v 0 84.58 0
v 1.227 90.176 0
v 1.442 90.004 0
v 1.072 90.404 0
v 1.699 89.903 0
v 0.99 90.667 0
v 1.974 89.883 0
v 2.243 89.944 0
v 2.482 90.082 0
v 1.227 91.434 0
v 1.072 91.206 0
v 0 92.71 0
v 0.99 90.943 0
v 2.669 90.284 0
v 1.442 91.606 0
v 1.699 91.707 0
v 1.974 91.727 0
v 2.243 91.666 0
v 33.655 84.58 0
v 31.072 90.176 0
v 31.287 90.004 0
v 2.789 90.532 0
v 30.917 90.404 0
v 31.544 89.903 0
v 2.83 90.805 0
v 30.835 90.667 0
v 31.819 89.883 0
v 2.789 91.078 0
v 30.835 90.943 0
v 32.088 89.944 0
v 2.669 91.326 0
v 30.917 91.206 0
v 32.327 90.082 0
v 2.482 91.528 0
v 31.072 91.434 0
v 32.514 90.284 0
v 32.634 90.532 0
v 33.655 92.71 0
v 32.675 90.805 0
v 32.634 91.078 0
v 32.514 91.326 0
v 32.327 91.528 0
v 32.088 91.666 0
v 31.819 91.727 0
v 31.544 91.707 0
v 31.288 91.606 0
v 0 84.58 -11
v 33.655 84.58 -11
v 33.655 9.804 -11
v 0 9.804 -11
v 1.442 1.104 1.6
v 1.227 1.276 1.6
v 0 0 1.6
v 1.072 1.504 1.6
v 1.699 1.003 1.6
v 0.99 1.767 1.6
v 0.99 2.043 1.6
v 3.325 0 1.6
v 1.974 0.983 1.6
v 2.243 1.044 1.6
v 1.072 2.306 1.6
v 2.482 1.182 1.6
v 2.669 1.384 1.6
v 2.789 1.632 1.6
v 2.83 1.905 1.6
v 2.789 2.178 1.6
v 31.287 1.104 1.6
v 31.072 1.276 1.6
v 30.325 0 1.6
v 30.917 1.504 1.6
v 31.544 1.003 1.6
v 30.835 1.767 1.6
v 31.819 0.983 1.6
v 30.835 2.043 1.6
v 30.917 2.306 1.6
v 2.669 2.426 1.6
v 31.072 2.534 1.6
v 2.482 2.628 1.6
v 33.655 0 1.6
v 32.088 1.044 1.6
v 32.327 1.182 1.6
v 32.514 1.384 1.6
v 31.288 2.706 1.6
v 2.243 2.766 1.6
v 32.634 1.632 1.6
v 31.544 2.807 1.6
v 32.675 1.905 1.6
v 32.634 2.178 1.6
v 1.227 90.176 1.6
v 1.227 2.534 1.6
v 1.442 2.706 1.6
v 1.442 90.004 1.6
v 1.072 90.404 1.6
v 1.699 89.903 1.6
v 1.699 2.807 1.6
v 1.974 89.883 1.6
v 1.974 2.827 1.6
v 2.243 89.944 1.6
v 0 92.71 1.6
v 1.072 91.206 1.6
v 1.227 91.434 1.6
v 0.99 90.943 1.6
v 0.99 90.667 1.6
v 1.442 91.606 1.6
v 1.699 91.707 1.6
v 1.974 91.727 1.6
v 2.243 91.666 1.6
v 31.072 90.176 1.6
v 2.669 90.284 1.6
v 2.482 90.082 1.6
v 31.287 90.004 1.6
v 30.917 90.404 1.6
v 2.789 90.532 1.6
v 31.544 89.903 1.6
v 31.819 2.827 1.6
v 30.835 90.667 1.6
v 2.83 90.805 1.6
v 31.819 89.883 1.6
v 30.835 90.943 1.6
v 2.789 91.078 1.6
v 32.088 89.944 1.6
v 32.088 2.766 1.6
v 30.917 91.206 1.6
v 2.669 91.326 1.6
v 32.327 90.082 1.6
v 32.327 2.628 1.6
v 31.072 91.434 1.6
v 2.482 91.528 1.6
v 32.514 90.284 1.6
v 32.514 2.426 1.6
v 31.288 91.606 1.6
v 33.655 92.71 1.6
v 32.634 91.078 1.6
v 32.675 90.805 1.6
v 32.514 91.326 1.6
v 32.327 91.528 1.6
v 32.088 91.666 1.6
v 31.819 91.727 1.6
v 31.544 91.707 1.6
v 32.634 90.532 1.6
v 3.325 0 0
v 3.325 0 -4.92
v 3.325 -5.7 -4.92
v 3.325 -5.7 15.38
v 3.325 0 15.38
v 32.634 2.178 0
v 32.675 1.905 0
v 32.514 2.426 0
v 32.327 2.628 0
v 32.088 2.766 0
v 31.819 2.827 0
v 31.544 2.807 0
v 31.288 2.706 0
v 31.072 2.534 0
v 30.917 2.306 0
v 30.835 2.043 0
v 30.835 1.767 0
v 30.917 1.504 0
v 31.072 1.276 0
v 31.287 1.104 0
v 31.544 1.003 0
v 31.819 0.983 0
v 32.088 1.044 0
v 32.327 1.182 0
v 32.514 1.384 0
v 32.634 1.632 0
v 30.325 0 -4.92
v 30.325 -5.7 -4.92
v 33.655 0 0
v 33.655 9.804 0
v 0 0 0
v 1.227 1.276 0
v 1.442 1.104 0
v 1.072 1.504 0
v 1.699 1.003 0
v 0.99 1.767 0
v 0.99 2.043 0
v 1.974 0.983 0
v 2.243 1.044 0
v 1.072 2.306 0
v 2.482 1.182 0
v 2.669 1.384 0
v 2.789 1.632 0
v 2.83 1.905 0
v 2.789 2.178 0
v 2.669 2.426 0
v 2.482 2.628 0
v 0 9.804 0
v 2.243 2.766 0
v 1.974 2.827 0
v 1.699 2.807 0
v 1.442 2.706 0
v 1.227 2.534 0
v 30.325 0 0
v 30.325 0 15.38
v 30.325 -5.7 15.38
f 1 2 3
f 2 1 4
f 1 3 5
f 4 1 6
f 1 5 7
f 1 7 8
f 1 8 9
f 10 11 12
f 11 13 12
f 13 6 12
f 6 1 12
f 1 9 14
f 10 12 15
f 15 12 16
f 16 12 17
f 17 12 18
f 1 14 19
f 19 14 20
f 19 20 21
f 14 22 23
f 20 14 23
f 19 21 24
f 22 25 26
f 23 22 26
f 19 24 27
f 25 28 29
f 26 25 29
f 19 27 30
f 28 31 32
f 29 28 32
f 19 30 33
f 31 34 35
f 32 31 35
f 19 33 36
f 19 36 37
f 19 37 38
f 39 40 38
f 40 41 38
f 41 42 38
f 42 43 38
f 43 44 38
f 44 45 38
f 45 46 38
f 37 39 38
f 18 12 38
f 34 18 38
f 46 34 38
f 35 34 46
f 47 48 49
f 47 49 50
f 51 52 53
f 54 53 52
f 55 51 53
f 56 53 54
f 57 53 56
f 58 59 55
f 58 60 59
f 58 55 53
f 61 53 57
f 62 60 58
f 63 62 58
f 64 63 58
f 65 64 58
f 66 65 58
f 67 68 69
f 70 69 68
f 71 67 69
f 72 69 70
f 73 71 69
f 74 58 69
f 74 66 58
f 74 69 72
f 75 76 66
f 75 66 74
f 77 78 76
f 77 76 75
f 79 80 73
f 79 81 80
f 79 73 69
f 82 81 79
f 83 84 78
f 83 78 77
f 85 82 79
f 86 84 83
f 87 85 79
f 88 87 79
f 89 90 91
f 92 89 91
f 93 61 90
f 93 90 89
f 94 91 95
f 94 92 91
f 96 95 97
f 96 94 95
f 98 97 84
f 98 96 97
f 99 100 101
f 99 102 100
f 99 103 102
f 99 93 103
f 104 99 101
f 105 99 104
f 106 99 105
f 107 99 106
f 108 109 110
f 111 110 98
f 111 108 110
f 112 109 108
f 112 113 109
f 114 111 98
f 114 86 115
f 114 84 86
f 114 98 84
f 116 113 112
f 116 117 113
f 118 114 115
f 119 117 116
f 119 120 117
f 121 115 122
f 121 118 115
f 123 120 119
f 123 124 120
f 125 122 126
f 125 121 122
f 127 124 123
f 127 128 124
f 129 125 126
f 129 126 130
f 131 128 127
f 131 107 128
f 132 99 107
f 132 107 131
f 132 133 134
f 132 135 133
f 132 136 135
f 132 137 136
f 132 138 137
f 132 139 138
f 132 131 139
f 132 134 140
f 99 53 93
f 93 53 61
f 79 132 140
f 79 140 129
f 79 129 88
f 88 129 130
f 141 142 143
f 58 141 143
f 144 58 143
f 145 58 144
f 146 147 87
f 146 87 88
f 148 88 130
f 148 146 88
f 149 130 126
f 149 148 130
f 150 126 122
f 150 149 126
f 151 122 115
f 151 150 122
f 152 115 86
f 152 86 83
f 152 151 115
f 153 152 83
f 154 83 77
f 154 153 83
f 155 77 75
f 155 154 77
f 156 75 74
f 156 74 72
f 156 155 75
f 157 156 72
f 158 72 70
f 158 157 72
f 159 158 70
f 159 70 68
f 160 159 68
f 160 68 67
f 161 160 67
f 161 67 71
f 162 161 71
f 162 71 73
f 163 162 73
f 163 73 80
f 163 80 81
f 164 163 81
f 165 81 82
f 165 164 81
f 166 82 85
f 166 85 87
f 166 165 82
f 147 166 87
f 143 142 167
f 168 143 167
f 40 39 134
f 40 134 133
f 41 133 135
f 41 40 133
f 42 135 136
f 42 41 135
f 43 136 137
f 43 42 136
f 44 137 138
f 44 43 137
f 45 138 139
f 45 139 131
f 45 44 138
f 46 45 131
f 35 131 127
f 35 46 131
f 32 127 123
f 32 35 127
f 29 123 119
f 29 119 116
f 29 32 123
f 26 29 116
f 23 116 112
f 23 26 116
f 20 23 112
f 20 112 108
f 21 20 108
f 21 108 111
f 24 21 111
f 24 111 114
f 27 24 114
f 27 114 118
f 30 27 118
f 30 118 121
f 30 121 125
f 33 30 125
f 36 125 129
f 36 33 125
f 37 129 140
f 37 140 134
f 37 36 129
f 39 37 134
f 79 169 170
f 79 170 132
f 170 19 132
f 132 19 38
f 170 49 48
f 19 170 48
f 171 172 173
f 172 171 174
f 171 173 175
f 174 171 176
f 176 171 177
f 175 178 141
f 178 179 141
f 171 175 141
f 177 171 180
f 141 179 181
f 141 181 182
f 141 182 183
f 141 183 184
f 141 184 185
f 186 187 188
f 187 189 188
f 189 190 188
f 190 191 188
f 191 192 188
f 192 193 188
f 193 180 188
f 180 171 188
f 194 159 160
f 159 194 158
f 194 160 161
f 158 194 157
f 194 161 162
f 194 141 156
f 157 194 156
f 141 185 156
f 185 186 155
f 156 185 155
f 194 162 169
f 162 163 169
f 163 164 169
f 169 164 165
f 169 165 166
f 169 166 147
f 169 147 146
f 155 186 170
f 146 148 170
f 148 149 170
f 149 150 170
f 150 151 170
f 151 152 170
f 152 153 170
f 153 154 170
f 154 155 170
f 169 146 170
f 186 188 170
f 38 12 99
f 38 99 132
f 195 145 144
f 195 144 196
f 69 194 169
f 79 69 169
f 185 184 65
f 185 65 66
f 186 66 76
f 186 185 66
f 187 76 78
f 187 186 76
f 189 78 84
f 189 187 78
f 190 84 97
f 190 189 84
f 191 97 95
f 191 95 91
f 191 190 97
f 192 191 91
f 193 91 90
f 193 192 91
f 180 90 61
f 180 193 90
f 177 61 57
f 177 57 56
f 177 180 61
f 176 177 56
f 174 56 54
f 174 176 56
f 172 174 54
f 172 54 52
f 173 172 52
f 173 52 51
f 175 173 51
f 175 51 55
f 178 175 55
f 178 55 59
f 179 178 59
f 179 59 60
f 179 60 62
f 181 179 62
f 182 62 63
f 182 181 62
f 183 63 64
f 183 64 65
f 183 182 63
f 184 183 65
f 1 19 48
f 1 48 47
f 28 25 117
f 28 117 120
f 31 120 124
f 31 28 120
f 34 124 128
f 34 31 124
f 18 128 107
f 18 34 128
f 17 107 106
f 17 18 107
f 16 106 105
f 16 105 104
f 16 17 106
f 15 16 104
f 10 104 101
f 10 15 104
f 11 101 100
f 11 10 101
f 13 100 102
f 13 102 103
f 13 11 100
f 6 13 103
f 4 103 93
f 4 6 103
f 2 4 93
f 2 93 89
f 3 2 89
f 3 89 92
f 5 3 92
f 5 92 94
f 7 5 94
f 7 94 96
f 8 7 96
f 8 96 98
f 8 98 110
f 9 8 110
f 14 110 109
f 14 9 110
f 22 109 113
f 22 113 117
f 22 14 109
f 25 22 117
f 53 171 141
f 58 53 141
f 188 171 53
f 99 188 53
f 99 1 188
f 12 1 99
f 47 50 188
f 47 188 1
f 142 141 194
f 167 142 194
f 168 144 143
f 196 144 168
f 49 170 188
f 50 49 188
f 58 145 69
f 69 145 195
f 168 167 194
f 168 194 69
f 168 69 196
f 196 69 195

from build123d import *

# Parameters (mm, degrees)
SKETCH1_W           = 33.655
SKETCH1_H           = 92.71
SKETCH1_R           = 0.925
BOSS_EXTRUDE1_DEPTH = 1.6
SKETCH2_W           = 33.655
SKETCH2_H           = 74.776129116
BOSS_EXTRUDE2_DEPTH = 11
SKETCH3_W           = 27
SKETCH3_H           = 20.3
BOSS_EXTRUDE3_DEPTH = 5.7


with BuildPart() as part:
    # Sketch1 → Boss-Extrude1 (new body)
    with BuildSketch(Plane.XY):
        with Locations((16.8275, 46.355)):
            Rectangle(SKETCH1_W, SKETCH1_H)
        with Locations((1.905, 90.805)):
            Circle(SKETCH1_R, mode=Mode.SUBTRACT)
        with Locations((31.75, 90.805)):
            Circle(SKETCH1_R, mode=Mode.SUBTRACT)
        with Locations((1.905, 1.905)):
            Circle(SKETCH1_R, mode=Mode.SUBTRACT)
        with Locations((31.75, 1.905)):
            Circle(SKETCH1_R, mode=Mode.SUBTRACT)
    extrude(amount=BOSS_EXTRUDE1_DEPTH)

    # Sketch2 → Boss-Extrude2 (add)
    with BuildSketch(Plane(origin=(0, 0, 0), x_dir=(-1, 0, 0), z_dir=(0, 0, -1))):
        with Locations((-16.8275, 47.192358669)):
            Rectangle(SKETCH2_W, SKETCH2_H)
    extrude(amount=BOSS_EXTRUDE2_DEPTH)

    # Sketch3 → Boss-Extrude3 (add)
    with BuildSketch(Plane.XZ):
        with Locations((16.825, 5.23)):
            Rectangle(SKETCH3_W, SKETCH3_H)
    extrude(amount=BOSS_EXTRUDE3_DEPTH)


solid = part.part
